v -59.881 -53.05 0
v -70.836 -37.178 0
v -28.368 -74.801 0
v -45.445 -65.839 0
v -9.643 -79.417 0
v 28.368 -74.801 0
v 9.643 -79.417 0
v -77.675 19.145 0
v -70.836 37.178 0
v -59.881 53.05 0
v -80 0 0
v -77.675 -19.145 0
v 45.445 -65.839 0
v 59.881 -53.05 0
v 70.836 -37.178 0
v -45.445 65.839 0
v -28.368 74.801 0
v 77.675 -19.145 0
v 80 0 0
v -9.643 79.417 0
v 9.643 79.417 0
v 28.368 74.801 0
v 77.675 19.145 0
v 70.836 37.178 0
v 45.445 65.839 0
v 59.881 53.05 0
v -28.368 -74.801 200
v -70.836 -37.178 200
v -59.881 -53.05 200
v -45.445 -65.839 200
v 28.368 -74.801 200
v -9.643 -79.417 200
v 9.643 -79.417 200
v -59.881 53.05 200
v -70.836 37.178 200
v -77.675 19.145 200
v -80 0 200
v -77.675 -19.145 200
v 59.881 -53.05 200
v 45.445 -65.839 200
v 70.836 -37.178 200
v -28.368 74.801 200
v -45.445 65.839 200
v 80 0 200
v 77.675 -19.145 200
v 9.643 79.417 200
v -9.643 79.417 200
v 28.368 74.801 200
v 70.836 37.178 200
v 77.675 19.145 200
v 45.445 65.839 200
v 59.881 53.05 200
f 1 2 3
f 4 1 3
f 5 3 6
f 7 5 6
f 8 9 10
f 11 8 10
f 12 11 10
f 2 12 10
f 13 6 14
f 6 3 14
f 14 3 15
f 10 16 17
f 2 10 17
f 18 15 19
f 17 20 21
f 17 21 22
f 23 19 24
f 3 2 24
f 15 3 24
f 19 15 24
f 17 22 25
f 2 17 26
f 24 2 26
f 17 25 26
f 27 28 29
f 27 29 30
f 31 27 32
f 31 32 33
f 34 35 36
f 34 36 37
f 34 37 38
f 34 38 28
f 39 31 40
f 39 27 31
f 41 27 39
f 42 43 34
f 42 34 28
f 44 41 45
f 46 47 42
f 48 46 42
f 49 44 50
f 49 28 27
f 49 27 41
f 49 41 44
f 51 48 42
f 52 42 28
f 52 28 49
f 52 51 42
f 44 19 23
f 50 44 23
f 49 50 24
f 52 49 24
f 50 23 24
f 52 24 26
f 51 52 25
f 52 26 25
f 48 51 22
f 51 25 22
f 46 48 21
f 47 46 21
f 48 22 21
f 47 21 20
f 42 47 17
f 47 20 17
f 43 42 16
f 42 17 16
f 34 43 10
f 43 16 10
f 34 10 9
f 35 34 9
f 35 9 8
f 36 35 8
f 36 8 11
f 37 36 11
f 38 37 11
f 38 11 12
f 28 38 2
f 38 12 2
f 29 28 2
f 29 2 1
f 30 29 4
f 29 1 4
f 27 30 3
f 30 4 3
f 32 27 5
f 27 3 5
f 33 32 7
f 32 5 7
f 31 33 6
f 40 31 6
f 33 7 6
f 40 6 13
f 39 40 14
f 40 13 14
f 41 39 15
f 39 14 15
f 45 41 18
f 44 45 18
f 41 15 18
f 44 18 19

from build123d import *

# Parameters (mm, degrees)
F0_R     = 80
F1_DEPTH = 200


with BuildPart() as f1:
    # F0 (on Top) → F1 (new body)
    with BuildSketch(Plane.XY):
        Circle(F0_R)
    extrude(amount=F1_DEPTH)


with BuildPart() as f2_1:
    # F2: copy of F1
    add(f1.part)


solid = f1.part
